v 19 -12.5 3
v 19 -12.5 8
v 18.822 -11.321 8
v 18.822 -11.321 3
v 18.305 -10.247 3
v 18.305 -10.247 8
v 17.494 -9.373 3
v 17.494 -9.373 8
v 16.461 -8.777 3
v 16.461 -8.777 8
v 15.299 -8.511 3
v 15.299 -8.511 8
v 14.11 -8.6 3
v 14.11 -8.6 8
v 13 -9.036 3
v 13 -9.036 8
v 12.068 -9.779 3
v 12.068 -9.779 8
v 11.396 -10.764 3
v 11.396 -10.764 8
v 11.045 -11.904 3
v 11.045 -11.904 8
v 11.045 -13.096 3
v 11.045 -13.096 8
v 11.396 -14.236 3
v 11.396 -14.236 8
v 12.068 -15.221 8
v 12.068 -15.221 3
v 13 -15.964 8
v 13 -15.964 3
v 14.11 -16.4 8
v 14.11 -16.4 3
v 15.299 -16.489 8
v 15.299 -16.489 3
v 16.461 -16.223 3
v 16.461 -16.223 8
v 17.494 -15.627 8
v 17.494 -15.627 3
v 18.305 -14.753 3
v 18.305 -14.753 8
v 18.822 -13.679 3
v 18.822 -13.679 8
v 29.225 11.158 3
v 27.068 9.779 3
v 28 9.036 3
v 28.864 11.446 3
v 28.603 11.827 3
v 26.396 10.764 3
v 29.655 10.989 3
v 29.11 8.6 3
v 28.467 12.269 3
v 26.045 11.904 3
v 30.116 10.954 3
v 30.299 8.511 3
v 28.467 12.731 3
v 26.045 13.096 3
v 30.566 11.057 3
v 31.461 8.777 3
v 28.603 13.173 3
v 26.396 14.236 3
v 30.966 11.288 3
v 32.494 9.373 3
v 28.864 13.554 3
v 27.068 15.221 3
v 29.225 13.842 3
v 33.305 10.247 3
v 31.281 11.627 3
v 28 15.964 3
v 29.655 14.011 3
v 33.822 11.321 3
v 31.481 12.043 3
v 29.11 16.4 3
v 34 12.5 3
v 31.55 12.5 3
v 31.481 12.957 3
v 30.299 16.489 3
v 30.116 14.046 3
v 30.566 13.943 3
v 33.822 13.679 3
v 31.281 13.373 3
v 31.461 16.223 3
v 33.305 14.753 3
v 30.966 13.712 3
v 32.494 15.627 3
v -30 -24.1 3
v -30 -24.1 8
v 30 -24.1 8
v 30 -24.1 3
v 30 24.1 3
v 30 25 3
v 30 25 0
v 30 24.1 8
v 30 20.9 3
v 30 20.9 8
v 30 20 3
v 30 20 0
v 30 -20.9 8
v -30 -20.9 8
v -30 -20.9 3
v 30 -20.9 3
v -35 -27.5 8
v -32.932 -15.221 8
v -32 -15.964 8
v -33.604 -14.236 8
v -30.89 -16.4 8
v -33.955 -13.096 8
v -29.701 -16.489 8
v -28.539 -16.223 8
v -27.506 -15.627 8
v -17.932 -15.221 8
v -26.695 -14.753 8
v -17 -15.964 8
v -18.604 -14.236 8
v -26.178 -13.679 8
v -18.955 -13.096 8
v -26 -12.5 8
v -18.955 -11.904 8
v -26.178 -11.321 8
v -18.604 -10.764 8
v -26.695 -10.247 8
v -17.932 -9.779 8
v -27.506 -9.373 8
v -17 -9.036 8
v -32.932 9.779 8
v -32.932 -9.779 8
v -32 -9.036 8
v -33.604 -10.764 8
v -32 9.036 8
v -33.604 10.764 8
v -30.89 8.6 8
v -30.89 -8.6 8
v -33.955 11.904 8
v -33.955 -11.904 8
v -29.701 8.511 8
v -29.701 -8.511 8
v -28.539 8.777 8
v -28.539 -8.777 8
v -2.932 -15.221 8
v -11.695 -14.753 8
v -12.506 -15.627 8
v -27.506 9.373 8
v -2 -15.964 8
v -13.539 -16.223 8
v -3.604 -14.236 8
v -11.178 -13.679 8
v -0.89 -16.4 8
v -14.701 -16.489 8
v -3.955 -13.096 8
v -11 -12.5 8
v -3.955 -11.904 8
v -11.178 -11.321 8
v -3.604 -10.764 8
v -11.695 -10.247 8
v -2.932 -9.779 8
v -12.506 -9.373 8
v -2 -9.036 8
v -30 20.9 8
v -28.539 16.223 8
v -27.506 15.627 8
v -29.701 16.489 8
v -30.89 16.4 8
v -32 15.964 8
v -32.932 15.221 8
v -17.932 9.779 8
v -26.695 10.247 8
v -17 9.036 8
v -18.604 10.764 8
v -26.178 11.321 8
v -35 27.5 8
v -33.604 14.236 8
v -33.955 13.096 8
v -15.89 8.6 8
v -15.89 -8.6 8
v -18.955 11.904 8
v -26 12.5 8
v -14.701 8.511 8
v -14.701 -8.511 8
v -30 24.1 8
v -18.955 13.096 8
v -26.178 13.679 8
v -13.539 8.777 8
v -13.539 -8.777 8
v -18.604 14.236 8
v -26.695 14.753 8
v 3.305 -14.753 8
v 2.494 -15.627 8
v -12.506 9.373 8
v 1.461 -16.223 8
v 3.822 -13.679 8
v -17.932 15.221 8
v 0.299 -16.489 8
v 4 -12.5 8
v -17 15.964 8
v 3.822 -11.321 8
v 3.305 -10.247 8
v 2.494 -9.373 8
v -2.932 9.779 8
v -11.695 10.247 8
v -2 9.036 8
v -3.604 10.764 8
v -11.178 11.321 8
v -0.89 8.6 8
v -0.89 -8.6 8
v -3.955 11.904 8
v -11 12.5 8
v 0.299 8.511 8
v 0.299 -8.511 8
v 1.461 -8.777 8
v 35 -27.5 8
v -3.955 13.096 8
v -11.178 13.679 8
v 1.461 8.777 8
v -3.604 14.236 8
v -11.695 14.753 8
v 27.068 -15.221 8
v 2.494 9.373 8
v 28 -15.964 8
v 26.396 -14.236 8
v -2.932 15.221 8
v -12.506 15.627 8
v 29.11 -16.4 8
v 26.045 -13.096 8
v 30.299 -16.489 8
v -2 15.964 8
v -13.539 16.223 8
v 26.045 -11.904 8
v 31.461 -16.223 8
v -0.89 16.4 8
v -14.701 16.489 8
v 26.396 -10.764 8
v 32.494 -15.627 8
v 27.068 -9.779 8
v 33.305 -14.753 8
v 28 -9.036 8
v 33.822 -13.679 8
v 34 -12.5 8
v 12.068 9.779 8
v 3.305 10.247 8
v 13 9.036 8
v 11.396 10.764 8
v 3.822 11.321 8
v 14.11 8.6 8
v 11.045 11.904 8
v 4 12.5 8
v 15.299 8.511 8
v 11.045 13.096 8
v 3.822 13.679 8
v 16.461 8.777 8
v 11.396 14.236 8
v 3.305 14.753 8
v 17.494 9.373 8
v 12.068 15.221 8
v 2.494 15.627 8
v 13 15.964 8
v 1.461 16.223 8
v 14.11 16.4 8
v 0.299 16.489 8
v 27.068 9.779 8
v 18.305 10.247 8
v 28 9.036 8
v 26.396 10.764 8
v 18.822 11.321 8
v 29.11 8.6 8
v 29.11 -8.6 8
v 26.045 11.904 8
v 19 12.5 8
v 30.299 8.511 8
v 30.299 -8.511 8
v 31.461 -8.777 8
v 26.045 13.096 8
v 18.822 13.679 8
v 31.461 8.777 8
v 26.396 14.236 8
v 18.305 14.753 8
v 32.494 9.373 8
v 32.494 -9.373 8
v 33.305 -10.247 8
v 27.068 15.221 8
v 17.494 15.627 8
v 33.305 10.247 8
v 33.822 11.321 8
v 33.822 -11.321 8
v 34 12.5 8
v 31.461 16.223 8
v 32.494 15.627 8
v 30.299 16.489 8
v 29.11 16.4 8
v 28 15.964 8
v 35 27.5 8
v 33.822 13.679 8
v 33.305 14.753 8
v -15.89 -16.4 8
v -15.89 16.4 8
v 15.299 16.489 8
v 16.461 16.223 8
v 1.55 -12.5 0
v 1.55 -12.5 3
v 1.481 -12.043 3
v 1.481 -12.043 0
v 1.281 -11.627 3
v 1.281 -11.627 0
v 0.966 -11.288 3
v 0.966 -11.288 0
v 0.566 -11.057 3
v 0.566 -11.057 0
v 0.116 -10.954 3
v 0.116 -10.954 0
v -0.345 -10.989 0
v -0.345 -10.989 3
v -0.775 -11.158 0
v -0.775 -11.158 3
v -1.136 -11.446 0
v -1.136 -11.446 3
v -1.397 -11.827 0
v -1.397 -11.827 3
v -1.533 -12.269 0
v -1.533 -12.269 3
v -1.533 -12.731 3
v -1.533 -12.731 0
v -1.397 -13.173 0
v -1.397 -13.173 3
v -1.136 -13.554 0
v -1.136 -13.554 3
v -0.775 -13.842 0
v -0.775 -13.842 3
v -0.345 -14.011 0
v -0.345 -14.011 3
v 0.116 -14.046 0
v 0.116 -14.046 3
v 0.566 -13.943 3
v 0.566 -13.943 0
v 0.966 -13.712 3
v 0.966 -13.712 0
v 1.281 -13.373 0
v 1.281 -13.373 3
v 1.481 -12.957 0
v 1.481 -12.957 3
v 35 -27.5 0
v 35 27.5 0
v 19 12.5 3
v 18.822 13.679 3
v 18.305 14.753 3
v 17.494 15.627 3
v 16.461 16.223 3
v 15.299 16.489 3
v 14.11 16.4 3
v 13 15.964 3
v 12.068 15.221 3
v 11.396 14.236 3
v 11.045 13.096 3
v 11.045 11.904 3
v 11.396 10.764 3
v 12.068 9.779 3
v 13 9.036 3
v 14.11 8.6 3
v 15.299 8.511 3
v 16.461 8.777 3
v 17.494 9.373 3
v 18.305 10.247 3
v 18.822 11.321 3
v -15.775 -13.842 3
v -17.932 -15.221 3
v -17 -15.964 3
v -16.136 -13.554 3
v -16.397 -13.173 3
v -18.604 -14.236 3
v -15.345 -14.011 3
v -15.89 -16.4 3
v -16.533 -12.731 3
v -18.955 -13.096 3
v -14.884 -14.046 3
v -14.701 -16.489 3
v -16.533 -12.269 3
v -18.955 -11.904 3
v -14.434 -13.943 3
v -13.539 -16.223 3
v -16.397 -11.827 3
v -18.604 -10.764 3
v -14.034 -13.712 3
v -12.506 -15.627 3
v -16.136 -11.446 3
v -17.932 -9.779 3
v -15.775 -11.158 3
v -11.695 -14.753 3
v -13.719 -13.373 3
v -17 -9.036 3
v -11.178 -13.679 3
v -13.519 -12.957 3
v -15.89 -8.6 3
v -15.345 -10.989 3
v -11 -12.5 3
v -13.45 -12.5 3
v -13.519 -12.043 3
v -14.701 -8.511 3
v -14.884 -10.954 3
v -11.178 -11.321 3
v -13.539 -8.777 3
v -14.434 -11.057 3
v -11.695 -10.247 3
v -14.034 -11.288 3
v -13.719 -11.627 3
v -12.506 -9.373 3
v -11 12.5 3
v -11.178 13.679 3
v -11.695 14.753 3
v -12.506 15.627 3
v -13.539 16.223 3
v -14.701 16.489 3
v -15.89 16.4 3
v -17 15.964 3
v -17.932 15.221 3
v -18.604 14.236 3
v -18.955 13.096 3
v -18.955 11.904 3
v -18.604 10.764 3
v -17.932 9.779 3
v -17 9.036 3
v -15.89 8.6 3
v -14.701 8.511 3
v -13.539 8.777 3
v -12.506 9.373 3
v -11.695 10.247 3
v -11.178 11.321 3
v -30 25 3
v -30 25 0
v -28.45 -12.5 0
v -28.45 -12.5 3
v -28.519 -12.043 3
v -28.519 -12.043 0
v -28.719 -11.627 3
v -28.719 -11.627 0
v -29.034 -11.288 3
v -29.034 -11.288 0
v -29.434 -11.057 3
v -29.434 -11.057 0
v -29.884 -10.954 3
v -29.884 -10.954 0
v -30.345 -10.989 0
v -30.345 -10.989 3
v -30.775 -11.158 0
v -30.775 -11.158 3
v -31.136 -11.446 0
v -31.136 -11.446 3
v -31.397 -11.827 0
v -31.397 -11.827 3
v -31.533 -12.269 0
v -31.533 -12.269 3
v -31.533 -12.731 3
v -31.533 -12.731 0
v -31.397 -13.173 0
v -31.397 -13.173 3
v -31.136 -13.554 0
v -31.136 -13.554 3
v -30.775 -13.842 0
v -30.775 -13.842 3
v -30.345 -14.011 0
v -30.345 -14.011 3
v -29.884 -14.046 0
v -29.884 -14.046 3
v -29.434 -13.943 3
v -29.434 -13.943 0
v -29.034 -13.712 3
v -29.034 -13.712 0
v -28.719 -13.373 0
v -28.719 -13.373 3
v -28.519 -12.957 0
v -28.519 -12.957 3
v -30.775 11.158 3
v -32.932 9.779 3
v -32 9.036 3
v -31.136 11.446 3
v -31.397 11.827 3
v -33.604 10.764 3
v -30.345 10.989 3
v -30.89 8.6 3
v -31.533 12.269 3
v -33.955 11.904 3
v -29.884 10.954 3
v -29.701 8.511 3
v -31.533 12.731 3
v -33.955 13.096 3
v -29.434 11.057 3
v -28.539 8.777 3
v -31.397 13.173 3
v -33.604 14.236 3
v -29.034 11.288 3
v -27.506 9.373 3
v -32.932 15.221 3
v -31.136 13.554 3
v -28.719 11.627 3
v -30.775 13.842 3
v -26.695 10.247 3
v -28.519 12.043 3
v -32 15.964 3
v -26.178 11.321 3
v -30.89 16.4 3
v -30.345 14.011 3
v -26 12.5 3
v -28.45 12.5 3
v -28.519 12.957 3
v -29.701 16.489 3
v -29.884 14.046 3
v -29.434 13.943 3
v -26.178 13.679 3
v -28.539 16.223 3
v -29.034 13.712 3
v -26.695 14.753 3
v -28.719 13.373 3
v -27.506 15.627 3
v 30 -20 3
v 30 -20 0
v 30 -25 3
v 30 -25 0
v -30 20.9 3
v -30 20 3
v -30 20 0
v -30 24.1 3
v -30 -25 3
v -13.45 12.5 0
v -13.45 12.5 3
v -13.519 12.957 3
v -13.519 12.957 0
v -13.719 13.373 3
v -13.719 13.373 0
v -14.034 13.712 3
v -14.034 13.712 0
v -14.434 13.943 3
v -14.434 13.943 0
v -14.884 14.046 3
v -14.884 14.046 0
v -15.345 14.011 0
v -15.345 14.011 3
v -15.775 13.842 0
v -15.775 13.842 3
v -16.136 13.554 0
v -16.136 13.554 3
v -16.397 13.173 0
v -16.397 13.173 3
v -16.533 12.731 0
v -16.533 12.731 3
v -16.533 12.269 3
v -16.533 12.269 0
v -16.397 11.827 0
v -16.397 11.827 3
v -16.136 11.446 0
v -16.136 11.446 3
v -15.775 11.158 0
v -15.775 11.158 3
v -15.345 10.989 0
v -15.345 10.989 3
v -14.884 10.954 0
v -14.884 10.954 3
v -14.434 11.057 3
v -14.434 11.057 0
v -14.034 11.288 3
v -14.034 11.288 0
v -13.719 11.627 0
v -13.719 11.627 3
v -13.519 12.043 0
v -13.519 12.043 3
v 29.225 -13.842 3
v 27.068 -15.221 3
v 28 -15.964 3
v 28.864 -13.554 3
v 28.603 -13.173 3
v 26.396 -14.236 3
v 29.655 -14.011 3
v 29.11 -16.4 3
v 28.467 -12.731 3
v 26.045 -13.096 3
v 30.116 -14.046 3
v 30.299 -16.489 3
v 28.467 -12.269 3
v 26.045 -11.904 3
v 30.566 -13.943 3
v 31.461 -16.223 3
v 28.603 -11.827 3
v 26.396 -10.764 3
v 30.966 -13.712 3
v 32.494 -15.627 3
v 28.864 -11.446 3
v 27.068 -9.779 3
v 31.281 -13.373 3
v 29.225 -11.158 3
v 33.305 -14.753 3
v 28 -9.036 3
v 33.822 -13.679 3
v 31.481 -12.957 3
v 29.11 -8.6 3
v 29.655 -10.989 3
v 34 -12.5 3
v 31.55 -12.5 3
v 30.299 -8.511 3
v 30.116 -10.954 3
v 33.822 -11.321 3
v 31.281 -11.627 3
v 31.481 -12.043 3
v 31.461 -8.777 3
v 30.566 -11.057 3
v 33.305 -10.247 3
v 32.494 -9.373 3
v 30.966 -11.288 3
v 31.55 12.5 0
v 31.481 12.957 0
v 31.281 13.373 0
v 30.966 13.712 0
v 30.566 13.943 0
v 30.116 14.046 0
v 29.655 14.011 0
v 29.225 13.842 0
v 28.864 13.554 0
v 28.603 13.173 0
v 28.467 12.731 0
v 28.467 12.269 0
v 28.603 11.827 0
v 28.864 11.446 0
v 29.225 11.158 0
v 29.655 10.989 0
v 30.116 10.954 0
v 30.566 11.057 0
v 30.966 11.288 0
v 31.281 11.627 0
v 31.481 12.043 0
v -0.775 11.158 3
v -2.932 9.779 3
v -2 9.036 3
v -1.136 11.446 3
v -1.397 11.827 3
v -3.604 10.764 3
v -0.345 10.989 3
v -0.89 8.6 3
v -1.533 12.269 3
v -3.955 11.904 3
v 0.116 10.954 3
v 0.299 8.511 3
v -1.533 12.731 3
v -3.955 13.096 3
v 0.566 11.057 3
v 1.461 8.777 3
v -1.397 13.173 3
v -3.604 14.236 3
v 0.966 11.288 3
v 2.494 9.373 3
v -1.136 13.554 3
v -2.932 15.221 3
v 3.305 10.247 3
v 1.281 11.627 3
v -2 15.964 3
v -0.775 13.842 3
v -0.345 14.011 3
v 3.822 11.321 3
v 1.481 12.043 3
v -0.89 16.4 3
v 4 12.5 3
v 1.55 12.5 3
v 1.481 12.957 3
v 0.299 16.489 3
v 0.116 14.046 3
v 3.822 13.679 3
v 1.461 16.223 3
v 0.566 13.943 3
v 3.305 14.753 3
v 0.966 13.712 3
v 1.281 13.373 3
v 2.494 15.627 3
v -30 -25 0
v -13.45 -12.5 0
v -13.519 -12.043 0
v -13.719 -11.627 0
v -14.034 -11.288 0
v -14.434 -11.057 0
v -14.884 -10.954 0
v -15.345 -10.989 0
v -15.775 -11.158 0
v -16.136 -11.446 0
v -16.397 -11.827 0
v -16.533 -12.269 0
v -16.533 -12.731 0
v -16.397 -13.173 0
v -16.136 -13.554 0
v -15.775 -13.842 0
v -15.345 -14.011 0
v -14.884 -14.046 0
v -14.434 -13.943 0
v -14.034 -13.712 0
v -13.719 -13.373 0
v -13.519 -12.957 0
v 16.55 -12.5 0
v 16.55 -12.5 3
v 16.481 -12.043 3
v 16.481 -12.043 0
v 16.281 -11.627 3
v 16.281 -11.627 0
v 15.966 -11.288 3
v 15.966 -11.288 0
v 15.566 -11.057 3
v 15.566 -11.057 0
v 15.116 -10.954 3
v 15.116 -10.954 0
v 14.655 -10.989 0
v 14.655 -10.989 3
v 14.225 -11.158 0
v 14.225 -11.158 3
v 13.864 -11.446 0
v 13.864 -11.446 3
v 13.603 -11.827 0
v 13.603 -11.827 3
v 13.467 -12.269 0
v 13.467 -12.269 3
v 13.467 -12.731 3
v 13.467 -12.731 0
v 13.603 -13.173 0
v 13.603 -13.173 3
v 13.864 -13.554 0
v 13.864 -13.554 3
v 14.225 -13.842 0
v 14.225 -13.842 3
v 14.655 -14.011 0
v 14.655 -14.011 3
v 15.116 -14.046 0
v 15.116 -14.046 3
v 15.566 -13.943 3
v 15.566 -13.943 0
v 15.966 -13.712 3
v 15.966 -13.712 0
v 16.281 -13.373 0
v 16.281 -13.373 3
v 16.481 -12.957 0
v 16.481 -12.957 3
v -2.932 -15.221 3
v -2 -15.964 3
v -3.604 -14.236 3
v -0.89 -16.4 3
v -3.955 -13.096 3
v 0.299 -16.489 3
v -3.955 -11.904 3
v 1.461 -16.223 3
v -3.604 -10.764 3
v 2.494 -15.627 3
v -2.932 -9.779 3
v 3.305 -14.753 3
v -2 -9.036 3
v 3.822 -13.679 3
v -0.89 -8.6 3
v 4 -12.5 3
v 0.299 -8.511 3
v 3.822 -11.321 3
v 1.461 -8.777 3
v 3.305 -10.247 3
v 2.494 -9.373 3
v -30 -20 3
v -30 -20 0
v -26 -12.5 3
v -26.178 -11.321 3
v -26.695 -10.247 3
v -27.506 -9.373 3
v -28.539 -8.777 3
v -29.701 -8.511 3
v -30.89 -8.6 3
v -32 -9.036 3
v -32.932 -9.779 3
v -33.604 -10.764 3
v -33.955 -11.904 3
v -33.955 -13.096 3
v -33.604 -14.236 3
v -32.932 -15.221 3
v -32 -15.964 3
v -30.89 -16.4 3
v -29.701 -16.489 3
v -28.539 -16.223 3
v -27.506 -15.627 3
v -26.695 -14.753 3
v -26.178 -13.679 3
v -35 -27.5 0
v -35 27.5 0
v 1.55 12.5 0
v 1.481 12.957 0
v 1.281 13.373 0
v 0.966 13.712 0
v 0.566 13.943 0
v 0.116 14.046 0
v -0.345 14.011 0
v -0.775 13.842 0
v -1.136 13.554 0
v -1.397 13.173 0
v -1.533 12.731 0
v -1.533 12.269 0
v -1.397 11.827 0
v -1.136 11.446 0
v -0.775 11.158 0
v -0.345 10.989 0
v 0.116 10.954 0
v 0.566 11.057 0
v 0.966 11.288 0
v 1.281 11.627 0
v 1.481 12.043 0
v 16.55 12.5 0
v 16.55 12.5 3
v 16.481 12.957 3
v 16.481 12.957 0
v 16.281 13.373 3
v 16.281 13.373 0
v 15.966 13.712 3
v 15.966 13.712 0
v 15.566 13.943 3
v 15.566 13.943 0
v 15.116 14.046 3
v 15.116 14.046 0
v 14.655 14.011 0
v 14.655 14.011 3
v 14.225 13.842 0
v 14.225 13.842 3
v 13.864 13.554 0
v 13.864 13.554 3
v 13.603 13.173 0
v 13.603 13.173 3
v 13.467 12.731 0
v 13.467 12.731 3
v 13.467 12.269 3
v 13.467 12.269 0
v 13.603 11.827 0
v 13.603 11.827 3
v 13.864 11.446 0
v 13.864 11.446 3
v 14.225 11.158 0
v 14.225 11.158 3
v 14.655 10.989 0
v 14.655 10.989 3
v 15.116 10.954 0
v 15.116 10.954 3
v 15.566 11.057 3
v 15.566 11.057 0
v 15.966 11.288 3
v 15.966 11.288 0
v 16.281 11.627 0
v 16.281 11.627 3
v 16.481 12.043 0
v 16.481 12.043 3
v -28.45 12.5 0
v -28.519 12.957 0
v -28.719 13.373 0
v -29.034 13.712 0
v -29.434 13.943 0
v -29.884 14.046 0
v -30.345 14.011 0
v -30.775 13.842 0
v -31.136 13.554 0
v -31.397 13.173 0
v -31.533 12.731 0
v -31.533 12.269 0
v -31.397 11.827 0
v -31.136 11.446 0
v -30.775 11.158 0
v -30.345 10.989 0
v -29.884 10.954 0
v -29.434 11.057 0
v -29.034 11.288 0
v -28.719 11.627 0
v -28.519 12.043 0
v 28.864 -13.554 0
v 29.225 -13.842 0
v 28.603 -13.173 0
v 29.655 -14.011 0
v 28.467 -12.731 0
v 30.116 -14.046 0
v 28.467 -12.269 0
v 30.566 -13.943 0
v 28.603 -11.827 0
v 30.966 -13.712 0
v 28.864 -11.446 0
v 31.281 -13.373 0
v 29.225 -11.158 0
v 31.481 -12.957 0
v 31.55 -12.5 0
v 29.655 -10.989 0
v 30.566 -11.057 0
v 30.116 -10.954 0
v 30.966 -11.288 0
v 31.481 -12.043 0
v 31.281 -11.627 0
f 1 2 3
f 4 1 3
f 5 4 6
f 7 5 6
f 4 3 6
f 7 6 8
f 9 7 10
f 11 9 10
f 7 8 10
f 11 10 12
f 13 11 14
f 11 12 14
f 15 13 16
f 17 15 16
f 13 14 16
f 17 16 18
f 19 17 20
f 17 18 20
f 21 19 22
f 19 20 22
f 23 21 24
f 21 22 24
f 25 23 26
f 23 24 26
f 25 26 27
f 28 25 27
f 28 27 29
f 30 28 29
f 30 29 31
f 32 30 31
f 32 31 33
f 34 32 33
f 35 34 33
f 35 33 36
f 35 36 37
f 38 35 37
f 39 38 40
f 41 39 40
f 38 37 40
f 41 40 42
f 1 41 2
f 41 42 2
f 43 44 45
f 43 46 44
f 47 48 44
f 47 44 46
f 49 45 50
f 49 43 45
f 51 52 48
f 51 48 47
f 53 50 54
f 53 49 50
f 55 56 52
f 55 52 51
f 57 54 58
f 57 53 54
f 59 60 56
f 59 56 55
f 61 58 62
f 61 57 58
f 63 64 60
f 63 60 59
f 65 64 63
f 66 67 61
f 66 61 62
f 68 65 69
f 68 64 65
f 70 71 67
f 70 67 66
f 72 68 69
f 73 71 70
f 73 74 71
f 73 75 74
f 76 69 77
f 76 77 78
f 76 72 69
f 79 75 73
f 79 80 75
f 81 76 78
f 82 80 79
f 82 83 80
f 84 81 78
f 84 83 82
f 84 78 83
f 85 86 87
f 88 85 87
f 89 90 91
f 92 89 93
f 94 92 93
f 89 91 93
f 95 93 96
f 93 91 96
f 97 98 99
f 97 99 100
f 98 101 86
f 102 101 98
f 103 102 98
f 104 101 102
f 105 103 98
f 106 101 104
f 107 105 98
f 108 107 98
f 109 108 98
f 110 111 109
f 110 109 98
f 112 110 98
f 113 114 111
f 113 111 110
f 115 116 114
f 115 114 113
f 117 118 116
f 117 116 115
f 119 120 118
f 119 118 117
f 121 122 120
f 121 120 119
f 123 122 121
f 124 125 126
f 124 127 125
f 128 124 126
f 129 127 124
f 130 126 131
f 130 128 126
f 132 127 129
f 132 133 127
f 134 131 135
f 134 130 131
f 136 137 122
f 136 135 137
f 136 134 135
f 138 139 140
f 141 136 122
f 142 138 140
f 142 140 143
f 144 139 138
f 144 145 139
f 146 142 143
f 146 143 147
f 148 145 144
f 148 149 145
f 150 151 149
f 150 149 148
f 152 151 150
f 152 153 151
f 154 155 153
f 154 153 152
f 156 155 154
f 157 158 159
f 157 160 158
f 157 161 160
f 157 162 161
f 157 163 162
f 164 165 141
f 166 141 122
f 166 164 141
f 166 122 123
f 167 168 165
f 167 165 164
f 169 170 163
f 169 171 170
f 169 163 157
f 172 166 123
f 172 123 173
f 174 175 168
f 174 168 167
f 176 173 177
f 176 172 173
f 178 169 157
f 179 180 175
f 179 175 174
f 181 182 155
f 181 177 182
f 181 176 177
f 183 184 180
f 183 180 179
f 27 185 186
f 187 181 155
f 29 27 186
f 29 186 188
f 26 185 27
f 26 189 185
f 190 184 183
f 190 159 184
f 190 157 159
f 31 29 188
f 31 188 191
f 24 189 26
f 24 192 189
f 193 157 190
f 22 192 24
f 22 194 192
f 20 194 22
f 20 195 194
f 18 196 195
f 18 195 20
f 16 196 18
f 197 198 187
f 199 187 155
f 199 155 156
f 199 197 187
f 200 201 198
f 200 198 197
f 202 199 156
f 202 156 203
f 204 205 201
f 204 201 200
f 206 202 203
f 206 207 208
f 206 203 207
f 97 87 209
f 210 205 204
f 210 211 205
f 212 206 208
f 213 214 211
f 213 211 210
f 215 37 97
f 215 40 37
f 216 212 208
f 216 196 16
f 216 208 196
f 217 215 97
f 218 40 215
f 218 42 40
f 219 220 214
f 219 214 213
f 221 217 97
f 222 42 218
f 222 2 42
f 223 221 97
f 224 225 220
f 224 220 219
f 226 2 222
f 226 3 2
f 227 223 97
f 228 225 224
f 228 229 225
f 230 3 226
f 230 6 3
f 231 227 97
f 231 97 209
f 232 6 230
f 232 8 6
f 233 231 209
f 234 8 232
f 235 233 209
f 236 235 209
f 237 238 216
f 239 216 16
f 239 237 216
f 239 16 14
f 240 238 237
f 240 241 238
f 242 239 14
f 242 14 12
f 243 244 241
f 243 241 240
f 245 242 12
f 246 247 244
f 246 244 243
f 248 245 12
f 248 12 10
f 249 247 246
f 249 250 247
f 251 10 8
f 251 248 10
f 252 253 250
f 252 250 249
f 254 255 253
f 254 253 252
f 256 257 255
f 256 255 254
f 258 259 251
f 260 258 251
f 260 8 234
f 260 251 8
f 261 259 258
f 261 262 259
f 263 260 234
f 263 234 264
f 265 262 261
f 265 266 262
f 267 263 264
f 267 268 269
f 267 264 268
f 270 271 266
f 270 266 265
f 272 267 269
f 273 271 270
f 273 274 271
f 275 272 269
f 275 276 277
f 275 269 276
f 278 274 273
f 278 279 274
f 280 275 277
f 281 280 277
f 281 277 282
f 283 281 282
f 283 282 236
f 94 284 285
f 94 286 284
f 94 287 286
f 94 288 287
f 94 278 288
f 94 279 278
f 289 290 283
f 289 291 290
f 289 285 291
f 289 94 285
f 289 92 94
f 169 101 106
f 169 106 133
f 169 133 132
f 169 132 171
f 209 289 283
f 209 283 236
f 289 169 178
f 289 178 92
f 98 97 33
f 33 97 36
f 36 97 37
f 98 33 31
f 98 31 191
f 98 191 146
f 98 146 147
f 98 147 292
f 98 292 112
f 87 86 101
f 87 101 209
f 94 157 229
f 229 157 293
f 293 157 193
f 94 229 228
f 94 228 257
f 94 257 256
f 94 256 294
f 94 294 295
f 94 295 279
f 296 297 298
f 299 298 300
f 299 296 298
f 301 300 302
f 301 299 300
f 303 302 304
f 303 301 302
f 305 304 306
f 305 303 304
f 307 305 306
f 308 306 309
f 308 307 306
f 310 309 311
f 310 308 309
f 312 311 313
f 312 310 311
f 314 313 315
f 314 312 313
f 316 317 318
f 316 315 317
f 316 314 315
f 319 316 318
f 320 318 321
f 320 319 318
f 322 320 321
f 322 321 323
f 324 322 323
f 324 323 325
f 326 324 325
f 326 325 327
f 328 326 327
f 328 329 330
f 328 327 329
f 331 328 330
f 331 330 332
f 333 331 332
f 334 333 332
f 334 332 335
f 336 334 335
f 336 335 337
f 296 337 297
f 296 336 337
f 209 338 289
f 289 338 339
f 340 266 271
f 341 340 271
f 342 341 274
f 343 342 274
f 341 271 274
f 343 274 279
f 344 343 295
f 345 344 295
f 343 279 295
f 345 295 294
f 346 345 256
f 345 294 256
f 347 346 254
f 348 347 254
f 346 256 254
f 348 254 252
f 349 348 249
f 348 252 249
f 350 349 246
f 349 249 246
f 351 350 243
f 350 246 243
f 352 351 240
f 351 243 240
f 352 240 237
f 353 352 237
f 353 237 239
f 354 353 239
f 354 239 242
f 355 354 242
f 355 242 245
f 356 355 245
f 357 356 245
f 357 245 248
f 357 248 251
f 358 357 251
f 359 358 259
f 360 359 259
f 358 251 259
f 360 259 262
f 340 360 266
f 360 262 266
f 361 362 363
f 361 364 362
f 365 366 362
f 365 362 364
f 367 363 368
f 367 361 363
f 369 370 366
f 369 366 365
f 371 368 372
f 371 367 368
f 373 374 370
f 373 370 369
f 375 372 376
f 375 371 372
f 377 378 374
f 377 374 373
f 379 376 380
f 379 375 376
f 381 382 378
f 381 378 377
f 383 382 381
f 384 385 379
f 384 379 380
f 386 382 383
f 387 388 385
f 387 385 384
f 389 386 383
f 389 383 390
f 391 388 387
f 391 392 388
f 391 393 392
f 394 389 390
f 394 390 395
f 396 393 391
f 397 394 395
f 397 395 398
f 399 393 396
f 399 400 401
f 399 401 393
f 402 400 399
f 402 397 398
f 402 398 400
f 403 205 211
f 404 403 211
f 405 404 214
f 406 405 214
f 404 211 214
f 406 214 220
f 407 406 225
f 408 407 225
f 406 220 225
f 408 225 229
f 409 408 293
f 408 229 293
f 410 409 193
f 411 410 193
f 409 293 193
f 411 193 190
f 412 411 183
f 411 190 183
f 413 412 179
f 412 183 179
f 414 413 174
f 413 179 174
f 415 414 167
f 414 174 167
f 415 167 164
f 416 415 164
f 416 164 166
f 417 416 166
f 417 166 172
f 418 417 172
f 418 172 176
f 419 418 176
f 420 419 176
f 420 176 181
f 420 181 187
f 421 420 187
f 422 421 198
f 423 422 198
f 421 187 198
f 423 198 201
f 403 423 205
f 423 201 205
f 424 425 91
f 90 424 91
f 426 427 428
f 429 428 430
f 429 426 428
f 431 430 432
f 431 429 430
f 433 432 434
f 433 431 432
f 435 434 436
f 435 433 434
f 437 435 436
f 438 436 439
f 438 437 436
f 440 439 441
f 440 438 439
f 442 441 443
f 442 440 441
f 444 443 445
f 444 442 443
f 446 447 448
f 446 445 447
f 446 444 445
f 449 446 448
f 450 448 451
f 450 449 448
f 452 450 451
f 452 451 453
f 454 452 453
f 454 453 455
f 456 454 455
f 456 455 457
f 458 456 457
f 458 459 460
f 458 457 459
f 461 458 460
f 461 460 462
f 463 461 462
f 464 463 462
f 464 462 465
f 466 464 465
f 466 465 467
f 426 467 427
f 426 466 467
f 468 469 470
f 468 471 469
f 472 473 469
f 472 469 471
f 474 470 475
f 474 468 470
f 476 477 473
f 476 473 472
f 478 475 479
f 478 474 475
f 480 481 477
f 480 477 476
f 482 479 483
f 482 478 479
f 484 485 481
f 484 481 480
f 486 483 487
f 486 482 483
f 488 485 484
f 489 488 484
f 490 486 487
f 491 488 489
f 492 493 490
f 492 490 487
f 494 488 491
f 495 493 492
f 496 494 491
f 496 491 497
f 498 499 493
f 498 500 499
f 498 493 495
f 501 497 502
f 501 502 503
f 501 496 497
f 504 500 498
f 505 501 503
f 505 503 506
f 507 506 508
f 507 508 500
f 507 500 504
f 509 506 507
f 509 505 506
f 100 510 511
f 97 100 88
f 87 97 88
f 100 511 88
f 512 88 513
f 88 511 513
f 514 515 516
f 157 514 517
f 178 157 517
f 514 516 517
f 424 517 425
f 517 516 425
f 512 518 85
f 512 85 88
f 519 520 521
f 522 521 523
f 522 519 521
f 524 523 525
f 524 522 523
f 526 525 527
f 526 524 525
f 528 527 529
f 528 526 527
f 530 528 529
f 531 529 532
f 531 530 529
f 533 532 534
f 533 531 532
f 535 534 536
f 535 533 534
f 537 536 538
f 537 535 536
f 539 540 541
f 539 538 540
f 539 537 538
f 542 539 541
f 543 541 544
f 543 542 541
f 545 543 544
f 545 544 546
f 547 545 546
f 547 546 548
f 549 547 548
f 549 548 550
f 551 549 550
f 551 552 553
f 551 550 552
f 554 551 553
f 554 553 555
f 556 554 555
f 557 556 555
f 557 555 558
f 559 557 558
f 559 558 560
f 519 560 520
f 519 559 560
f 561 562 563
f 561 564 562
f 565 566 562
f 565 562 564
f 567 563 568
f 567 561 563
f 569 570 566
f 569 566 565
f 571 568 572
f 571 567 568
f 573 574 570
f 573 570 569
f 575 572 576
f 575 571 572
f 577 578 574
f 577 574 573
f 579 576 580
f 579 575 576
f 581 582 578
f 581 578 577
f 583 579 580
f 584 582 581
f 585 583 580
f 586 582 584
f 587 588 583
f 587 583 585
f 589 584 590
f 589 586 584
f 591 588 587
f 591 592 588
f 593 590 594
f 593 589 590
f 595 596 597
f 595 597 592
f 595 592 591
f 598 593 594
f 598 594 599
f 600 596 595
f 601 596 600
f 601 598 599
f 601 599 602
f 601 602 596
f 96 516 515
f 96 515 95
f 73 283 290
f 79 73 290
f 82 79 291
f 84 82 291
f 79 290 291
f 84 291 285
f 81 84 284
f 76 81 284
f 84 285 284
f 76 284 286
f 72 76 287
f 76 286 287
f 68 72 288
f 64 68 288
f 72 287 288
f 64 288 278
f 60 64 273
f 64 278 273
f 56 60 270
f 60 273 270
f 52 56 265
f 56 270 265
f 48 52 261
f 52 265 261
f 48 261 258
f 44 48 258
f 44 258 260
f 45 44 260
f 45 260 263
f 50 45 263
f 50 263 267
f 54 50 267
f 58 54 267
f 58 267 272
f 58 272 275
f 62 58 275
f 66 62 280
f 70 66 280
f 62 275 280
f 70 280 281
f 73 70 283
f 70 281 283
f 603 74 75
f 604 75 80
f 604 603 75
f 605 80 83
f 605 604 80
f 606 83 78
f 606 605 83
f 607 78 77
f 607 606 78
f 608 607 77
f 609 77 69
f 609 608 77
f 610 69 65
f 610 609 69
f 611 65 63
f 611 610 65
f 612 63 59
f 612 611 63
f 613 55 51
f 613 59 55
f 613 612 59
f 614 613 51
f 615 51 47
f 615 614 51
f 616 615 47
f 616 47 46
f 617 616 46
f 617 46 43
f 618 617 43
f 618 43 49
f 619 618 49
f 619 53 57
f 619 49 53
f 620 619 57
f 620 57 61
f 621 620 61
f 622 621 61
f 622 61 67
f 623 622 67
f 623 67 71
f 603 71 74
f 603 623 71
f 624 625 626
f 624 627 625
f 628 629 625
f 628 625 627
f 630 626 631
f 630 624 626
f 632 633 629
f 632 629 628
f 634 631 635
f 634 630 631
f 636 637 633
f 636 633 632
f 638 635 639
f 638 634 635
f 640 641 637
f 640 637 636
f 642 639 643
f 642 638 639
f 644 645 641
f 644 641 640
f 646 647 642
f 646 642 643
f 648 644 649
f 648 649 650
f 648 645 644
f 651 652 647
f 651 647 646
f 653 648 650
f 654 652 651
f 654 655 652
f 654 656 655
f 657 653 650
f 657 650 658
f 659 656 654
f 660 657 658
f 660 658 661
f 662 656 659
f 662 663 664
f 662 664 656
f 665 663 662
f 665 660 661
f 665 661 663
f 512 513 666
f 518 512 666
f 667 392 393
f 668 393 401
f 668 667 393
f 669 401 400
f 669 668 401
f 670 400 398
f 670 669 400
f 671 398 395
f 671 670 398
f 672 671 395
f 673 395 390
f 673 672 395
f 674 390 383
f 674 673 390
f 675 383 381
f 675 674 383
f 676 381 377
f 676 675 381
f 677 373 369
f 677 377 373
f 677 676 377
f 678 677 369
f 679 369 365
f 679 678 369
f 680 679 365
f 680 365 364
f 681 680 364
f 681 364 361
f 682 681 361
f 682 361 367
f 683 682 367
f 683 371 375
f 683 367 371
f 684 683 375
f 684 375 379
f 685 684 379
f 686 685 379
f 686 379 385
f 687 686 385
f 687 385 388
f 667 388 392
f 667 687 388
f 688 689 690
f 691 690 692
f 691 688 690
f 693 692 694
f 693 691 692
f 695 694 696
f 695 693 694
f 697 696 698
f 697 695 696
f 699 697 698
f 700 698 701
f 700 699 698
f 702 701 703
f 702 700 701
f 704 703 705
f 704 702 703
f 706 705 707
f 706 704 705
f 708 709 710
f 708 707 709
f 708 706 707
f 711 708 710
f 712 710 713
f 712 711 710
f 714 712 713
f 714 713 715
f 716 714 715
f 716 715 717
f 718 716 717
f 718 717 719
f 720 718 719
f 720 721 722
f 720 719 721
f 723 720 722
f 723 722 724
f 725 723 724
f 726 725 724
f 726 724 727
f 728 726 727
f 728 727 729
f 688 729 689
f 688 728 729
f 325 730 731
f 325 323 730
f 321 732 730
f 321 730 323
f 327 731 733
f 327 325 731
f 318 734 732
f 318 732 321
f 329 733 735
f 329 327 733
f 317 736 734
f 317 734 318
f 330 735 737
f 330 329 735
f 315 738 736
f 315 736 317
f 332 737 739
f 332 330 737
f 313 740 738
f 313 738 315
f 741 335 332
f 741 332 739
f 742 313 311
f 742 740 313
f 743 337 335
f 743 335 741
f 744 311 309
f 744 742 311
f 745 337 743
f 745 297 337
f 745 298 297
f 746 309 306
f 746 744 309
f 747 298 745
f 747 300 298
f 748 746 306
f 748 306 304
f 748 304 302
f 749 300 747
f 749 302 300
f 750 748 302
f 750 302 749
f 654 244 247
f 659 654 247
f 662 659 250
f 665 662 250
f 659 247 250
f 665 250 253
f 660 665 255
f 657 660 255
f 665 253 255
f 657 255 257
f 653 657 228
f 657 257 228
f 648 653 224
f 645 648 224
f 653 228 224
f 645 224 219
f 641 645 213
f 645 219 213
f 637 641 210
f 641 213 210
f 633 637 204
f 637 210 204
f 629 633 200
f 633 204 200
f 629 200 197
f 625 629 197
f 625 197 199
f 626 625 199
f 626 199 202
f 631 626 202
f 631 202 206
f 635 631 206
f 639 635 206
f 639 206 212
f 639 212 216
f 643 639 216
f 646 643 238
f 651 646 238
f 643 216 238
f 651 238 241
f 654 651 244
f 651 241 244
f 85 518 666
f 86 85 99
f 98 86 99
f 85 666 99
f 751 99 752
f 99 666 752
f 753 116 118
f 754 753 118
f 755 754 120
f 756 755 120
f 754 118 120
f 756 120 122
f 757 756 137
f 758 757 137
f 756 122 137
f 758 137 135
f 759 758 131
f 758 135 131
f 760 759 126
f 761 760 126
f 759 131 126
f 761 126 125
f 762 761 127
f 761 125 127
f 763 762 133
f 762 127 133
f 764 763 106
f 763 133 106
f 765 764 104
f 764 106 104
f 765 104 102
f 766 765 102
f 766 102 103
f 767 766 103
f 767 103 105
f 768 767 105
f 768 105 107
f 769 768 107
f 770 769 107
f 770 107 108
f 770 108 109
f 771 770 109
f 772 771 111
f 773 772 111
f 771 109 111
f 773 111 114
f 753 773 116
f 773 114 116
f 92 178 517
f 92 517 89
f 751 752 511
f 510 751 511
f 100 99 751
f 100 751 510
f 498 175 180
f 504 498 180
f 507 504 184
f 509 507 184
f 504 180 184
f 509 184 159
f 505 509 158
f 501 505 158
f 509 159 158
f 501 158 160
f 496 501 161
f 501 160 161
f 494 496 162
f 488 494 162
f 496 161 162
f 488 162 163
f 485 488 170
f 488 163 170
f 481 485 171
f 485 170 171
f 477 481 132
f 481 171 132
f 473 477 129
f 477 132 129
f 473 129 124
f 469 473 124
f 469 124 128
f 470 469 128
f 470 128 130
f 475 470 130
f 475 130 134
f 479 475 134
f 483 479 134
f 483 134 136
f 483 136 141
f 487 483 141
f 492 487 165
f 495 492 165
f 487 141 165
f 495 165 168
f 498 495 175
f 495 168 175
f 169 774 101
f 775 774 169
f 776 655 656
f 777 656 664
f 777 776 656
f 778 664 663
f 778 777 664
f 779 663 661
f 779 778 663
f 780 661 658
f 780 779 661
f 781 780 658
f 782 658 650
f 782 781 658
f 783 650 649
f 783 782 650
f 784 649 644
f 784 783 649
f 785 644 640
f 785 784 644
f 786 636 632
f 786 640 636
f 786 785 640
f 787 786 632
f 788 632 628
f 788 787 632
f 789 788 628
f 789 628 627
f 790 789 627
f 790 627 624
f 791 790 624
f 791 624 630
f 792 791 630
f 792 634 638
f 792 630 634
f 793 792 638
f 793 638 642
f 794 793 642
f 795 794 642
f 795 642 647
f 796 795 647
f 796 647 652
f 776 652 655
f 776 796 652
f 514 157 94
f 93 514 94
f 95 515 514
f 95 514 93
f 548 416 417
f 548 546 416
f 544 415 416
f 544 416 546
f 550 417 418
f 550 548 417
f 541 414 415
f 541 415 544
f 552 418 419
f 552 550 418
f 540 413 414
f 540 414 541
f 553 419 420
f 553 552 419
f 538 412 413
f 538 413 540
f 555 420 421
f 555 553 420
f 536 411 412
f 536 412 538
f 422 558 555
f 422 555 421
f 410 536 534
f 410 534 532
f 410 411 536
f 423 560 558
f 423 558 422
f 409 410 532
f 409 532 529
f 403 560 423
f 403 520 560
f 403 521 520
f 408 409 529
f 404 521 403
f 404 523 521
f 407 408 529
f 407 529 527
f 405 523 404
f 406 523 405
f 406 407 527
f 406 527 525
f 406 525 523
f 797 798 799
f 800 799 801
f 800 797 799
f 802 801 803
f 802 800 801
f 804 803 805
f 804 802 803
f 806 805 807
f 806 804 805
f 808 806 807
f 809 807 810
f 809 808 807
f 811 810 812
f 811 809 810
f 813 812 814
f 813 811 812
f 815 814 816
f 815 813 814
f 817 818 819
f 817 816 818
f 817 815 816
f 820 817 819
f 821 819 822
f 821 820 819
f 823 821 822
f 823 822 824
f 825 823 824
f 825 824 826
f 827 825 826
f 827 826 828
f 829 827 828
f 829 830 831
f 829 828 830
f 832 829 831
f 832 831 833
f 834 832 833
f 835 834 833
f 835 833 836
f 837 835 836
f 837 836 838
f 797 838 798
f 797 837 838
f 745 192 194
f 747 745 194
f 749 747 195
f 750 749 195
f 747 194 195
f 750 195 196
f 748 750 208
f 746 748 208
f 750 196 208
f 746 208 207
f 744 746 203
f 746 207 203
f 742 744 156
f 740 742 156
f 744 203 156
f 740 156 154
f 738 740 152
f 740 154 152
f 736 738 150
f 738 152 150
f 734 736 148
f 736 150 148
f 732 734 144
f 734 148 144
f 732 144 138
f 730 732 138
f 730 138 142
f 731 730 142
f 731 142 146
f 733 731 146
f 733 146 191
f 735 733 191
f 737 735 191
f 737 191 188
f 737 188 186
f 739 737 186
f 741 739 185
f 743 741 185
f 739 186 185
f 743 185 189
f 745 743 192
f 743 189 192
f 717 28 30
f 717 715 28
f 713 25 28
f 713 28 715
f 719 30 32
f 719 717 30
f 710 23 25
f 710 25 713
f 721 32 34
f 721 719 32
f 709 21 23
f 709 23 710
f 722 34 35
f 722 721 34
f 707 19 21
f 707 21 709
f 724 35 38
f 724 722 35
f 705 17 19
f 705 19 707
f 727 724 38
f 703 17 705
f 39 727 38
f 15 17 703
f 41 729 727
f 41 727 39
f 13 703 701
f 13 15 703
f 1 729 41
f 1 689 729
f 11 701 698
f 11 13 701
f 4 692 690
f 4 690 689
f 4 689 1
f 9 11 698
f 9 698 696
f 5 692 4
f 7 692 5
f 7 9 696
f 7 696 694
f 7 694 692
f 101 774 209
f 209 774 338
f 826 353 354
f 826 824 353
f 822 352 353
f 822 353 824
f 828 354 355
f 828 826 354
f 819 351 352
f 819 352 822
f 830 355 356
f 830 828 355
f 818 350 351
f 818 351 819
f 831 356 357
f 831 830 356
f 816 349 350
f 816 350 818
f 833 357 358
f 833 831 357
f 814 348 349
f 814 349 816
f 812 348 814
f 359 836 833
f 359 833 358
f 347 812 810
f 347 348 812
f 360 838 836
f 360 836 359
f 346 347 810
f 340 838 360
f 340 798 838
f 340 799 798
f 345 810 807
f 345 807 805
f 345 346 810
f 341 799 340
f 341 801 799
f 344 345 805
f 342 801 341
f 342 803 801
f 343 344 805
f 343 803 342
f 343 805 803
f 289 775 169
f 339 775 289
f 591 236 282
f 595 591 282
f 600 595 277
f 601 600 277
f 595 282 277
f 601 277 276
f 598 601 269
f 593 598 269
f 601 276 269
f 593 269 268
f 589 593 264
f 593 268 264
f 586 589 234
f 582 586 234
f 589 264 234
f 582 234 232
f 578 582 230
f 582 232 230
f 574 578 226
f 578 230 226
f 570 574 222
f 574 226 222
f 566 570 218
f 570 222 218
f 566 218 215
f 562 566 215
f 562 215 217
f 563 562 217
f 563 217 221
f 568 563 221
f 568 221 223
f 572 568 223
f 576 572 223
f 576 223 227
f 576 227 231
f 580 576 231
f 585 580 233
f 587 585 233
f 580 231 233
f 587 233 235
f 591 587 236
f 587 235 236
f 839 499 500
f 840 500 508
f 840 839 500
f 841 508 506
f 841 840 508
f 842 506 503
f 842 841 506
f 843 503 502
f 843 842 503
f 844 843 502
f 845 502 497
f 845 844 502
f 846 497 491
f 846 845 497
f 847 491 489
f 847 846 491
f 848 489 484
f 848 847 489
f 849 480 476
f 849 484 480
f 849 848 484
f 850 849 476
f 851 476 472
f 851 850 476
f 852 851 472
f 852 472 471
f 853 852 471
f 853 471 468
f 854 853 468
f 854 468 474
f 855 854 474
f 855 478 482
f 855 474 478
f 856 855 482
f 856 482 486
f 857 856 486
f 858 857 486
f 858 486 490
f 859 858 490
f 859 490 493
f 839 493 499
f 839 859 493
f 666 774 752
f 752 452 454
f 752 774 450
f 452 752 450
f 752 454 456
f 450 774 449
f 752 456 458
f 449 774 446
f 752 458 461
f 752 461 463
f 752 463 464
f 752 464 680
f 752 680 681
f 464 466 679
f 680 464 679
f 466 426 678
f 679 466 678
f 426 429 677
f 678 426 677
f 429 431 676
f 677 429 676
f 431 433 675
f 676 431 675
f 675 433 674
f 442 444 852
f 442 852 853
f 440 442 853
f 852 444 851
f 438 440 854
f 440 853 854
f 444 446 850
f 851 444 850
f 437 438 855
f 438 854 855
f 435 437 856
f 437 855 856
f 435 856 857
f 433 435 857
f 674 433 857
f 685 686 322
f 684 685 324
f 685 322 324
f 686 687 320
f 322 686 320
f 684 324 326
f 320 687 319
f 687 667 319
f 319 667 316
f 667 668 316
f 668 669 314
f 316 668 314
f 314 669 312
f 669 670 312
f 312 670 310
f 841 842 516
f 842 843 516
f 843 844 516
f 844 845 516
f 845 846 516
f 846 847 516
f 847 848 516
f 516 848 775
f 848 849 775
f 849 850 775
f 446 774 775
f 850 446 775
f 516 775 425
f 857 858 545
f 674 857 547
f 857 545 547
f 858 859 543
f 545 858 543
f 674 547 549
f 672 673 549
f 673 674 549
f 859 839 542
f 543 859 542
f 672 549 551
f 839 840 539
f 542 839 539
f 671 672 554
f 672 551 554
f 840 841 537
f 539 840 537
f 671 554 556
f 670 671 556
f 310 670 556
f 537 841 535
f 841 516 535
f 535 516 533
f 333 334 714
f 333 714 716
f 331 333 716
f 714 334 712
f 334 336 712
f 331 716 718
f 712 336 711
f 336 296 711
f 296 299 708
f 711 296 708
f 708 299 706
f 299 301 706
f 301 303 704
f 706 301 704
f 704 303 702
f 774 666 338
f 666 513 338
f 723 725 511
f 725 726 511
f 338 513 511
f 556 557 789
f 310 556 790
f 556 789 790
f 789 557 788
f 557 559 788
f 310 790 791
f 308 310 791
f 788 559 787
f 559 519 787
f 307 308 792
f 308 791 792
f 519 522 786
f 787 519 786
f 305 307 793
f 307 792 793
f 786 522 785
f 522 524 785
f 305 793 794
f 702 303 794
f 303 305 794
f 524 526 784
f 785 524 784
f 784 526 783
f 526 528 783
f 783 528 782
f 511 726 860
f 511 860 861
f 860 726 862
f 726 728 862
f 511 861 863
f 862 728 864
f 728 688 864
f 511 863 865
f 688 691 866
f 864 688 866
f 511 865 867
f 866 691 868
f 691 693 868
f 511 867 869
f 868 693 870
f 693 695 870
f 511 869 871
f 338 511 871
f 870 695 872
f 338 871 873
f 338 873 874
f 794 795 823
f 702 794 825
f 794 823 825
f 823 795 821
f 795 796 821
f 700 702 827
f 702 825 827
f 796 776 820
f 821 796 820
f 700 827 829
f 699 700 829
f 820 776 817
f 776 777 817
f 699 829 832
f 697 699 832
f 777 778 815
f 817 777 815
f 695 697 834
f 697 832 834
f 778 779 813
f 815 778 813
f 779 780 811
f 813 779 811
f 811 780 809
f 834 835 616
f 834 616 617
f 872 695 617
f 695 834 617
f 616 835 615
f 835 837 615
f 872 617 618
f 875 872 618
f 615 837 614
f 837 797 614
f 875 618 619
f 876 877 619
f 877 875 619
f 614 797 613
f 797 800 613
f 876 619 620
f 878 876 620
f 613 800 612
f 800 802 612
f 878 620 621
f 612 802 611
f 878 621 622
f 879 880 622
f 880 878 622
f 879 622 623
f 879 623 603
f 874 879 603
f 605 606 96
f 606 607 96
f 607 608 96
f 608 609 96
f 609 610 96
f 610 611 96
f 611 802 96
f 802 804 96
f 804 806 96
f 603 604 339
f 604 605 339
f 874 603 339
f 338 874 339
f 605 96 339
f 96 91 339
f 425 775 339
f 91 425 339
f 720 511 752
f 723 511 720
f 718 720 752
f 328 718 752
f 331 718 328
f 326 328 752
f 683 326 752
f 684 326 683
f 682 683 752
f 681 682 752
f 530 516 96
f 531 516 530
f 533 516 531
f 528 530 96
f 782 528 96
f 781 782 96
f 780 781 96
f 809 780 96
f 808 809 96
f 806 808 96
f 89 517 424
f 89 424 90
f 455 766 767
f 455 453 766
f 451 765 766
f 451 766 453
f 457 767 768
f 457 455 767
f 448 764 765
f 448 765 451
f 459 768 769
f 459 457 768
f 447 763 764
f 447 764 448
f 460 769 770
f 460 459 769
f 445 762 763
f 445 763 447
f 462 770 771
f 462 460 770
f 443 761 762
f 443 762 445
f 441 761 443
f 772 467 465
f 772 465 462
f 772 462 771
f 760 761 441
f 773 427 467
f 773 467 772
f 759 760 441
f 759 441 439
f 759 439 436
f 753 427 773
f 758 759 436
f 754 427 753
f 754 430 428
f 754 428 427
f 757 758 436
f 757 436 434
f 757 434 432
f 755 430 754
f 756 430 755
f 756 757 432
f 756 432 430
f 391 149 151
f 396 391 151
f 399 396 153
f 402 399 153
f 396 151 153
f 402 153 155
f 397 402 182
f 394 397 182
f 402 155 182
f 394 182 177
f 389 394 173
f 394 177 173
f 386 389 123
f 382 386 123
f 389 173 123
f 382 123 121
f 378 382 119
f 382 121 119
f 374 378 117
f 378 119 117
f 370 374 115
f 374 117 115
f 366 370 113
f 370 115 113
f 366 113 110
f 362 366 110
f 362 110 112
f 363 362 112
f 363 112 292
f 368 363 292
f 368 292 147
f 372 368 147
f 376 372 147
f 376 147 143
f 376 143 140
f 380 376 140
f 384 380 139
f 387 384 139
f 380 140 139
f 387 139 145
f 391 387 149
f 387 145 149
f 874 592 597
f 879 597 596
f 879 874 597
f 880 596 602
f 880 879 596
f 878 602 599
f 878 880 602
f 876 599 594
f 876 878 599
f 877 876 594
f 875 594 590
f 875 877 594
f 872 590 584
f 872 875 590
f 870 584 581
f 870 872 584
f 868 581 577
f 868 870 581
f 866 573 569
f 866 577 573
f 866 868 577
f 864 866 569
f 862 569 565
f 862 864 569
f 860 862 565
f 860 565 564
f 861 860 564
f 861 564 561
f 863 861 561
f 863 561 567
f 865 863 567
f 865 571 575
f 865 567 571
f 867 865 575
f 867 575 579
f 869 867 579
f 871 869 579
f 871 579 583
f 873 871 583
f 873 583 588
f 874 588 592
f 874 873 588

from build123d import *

# Parameters (mm, degrees)
F0_W     = 70
F0_H     = 55
F0_R     = 1.55
F1_DEPTH = 8
F2_R     = 4
F3_DEPTH = 5
F4_W     = 60
F4_H     = 1.6
F5_DEPTH = 5
F6_W     = 60
F6_H     = 2.5
F7_DEPTH = 3


with BuildPart() as f1:
    # F0 (on Top) → F1 (new body)
    with BuildSketch(Plane.XY):
        Rectangle(F0_W, F0_H)
        with Locations((-30, -12.5)):
            Circle(F0_R, mode=Mode.SUBTRACT)
        with Locations((-15, -12.5)):
            Circle(F0_R, mode=Mode.SUBTRACT)
        with Locations((0, -12.5)):
            Circle(F0_R, mode=Mode.SUBTRACT)
        with Locations((15, -12.5)):
            Circle(F0_R, mode=Mode.SUBTRACT)
        with Locations((30, -12.5)):
            Circle(F0_R, mode=Mode.SUBTRACT)
        with Locations((-30, 12.5)):
            Circle(F0_R, mode=Mode.SUBTRACT)
        with Locations((-15, 12.5)):
            Circle(F0_R, mode=Mode.SUBTRACT)
        with Locations((0, 12.5)):
            Circle(F0_R, mode=Mode.SUBTRACT)
        with Locations((15, 12.5)):
            Circle(F0_R, mode=Mode.SUBTRACT)
        with Locations((30, 12.5)):
            Circle(F0_R, mode=Mode.SUBTRACT)
    extrude(amount=F1_DEPTH)

    # F2 (on face) → F3 (cut)
    with BuildSketch(Plane.XY.offset(8)):
        with Locations((0, -12.5)):
            Circle(F2_R)
        with Locations((0, 12.5)):
            Circle(F2_R)
        with Locations((15, -12.5)):
            Circle(F2_R)
        with Locations((30, -12.5)):
            Circle(F2_R)
        with Locations((-15, -12.5)):
            Circle(F2_R)
        with Locations((-30, -12.5)):
            Circle(F2_R)
        with Locations((15, 12.5)):
            Circle(F2_R)
        with Locations((30, 12.5)):
            Circle(F2_R)
        with Locations((-15, 12.5)):
            Circle(F2_R)
        with Locations((-30, 12.5)):
            Circle(F2_R)
    extrude(amount=-F3_DEPTH, mode=Mode.SUBTRACT)

    # F4 (on face) → F5 (cut)
    with BuildSketch(Plane.XY.offset(8)):
        with Locations((0, -21.7)):
            Rectangle(F4_W, F4_H)
        with Locations((0, -23.3)):
            Rectangle(F4_W, F4_H)
        with Locations((0, 21.7)):
            Rectangle(F4_W, F4_H)
        with Locations((0, 23.3)):
            Rectangle(F4_W, F4_H)
    extrude(amount=-F5_DEPTH, mode=Mode.SUBTRACT)

    # F6 (on face) → F7 (cut)
    with BuildSketch(Plane(origin=(0, 0, 0), x_dir=(1, 0, 0), z_dir=(0, 0, -1))):
        Polygon((-30, 22.5), (-30, 20), (30, 20), (30, 22.5), (30, 25), (-30, 25), align=None)
        with Locations((0, -21.25)):
            Rectangle(F6_W, F6_H)
        with Locations((0, -23.75)):
            Rectangle(F6_W, F6_H)
    extrude(amount=-F7_DEPTH, mode=Mode.SUBTRACT)


solid = f1.part
